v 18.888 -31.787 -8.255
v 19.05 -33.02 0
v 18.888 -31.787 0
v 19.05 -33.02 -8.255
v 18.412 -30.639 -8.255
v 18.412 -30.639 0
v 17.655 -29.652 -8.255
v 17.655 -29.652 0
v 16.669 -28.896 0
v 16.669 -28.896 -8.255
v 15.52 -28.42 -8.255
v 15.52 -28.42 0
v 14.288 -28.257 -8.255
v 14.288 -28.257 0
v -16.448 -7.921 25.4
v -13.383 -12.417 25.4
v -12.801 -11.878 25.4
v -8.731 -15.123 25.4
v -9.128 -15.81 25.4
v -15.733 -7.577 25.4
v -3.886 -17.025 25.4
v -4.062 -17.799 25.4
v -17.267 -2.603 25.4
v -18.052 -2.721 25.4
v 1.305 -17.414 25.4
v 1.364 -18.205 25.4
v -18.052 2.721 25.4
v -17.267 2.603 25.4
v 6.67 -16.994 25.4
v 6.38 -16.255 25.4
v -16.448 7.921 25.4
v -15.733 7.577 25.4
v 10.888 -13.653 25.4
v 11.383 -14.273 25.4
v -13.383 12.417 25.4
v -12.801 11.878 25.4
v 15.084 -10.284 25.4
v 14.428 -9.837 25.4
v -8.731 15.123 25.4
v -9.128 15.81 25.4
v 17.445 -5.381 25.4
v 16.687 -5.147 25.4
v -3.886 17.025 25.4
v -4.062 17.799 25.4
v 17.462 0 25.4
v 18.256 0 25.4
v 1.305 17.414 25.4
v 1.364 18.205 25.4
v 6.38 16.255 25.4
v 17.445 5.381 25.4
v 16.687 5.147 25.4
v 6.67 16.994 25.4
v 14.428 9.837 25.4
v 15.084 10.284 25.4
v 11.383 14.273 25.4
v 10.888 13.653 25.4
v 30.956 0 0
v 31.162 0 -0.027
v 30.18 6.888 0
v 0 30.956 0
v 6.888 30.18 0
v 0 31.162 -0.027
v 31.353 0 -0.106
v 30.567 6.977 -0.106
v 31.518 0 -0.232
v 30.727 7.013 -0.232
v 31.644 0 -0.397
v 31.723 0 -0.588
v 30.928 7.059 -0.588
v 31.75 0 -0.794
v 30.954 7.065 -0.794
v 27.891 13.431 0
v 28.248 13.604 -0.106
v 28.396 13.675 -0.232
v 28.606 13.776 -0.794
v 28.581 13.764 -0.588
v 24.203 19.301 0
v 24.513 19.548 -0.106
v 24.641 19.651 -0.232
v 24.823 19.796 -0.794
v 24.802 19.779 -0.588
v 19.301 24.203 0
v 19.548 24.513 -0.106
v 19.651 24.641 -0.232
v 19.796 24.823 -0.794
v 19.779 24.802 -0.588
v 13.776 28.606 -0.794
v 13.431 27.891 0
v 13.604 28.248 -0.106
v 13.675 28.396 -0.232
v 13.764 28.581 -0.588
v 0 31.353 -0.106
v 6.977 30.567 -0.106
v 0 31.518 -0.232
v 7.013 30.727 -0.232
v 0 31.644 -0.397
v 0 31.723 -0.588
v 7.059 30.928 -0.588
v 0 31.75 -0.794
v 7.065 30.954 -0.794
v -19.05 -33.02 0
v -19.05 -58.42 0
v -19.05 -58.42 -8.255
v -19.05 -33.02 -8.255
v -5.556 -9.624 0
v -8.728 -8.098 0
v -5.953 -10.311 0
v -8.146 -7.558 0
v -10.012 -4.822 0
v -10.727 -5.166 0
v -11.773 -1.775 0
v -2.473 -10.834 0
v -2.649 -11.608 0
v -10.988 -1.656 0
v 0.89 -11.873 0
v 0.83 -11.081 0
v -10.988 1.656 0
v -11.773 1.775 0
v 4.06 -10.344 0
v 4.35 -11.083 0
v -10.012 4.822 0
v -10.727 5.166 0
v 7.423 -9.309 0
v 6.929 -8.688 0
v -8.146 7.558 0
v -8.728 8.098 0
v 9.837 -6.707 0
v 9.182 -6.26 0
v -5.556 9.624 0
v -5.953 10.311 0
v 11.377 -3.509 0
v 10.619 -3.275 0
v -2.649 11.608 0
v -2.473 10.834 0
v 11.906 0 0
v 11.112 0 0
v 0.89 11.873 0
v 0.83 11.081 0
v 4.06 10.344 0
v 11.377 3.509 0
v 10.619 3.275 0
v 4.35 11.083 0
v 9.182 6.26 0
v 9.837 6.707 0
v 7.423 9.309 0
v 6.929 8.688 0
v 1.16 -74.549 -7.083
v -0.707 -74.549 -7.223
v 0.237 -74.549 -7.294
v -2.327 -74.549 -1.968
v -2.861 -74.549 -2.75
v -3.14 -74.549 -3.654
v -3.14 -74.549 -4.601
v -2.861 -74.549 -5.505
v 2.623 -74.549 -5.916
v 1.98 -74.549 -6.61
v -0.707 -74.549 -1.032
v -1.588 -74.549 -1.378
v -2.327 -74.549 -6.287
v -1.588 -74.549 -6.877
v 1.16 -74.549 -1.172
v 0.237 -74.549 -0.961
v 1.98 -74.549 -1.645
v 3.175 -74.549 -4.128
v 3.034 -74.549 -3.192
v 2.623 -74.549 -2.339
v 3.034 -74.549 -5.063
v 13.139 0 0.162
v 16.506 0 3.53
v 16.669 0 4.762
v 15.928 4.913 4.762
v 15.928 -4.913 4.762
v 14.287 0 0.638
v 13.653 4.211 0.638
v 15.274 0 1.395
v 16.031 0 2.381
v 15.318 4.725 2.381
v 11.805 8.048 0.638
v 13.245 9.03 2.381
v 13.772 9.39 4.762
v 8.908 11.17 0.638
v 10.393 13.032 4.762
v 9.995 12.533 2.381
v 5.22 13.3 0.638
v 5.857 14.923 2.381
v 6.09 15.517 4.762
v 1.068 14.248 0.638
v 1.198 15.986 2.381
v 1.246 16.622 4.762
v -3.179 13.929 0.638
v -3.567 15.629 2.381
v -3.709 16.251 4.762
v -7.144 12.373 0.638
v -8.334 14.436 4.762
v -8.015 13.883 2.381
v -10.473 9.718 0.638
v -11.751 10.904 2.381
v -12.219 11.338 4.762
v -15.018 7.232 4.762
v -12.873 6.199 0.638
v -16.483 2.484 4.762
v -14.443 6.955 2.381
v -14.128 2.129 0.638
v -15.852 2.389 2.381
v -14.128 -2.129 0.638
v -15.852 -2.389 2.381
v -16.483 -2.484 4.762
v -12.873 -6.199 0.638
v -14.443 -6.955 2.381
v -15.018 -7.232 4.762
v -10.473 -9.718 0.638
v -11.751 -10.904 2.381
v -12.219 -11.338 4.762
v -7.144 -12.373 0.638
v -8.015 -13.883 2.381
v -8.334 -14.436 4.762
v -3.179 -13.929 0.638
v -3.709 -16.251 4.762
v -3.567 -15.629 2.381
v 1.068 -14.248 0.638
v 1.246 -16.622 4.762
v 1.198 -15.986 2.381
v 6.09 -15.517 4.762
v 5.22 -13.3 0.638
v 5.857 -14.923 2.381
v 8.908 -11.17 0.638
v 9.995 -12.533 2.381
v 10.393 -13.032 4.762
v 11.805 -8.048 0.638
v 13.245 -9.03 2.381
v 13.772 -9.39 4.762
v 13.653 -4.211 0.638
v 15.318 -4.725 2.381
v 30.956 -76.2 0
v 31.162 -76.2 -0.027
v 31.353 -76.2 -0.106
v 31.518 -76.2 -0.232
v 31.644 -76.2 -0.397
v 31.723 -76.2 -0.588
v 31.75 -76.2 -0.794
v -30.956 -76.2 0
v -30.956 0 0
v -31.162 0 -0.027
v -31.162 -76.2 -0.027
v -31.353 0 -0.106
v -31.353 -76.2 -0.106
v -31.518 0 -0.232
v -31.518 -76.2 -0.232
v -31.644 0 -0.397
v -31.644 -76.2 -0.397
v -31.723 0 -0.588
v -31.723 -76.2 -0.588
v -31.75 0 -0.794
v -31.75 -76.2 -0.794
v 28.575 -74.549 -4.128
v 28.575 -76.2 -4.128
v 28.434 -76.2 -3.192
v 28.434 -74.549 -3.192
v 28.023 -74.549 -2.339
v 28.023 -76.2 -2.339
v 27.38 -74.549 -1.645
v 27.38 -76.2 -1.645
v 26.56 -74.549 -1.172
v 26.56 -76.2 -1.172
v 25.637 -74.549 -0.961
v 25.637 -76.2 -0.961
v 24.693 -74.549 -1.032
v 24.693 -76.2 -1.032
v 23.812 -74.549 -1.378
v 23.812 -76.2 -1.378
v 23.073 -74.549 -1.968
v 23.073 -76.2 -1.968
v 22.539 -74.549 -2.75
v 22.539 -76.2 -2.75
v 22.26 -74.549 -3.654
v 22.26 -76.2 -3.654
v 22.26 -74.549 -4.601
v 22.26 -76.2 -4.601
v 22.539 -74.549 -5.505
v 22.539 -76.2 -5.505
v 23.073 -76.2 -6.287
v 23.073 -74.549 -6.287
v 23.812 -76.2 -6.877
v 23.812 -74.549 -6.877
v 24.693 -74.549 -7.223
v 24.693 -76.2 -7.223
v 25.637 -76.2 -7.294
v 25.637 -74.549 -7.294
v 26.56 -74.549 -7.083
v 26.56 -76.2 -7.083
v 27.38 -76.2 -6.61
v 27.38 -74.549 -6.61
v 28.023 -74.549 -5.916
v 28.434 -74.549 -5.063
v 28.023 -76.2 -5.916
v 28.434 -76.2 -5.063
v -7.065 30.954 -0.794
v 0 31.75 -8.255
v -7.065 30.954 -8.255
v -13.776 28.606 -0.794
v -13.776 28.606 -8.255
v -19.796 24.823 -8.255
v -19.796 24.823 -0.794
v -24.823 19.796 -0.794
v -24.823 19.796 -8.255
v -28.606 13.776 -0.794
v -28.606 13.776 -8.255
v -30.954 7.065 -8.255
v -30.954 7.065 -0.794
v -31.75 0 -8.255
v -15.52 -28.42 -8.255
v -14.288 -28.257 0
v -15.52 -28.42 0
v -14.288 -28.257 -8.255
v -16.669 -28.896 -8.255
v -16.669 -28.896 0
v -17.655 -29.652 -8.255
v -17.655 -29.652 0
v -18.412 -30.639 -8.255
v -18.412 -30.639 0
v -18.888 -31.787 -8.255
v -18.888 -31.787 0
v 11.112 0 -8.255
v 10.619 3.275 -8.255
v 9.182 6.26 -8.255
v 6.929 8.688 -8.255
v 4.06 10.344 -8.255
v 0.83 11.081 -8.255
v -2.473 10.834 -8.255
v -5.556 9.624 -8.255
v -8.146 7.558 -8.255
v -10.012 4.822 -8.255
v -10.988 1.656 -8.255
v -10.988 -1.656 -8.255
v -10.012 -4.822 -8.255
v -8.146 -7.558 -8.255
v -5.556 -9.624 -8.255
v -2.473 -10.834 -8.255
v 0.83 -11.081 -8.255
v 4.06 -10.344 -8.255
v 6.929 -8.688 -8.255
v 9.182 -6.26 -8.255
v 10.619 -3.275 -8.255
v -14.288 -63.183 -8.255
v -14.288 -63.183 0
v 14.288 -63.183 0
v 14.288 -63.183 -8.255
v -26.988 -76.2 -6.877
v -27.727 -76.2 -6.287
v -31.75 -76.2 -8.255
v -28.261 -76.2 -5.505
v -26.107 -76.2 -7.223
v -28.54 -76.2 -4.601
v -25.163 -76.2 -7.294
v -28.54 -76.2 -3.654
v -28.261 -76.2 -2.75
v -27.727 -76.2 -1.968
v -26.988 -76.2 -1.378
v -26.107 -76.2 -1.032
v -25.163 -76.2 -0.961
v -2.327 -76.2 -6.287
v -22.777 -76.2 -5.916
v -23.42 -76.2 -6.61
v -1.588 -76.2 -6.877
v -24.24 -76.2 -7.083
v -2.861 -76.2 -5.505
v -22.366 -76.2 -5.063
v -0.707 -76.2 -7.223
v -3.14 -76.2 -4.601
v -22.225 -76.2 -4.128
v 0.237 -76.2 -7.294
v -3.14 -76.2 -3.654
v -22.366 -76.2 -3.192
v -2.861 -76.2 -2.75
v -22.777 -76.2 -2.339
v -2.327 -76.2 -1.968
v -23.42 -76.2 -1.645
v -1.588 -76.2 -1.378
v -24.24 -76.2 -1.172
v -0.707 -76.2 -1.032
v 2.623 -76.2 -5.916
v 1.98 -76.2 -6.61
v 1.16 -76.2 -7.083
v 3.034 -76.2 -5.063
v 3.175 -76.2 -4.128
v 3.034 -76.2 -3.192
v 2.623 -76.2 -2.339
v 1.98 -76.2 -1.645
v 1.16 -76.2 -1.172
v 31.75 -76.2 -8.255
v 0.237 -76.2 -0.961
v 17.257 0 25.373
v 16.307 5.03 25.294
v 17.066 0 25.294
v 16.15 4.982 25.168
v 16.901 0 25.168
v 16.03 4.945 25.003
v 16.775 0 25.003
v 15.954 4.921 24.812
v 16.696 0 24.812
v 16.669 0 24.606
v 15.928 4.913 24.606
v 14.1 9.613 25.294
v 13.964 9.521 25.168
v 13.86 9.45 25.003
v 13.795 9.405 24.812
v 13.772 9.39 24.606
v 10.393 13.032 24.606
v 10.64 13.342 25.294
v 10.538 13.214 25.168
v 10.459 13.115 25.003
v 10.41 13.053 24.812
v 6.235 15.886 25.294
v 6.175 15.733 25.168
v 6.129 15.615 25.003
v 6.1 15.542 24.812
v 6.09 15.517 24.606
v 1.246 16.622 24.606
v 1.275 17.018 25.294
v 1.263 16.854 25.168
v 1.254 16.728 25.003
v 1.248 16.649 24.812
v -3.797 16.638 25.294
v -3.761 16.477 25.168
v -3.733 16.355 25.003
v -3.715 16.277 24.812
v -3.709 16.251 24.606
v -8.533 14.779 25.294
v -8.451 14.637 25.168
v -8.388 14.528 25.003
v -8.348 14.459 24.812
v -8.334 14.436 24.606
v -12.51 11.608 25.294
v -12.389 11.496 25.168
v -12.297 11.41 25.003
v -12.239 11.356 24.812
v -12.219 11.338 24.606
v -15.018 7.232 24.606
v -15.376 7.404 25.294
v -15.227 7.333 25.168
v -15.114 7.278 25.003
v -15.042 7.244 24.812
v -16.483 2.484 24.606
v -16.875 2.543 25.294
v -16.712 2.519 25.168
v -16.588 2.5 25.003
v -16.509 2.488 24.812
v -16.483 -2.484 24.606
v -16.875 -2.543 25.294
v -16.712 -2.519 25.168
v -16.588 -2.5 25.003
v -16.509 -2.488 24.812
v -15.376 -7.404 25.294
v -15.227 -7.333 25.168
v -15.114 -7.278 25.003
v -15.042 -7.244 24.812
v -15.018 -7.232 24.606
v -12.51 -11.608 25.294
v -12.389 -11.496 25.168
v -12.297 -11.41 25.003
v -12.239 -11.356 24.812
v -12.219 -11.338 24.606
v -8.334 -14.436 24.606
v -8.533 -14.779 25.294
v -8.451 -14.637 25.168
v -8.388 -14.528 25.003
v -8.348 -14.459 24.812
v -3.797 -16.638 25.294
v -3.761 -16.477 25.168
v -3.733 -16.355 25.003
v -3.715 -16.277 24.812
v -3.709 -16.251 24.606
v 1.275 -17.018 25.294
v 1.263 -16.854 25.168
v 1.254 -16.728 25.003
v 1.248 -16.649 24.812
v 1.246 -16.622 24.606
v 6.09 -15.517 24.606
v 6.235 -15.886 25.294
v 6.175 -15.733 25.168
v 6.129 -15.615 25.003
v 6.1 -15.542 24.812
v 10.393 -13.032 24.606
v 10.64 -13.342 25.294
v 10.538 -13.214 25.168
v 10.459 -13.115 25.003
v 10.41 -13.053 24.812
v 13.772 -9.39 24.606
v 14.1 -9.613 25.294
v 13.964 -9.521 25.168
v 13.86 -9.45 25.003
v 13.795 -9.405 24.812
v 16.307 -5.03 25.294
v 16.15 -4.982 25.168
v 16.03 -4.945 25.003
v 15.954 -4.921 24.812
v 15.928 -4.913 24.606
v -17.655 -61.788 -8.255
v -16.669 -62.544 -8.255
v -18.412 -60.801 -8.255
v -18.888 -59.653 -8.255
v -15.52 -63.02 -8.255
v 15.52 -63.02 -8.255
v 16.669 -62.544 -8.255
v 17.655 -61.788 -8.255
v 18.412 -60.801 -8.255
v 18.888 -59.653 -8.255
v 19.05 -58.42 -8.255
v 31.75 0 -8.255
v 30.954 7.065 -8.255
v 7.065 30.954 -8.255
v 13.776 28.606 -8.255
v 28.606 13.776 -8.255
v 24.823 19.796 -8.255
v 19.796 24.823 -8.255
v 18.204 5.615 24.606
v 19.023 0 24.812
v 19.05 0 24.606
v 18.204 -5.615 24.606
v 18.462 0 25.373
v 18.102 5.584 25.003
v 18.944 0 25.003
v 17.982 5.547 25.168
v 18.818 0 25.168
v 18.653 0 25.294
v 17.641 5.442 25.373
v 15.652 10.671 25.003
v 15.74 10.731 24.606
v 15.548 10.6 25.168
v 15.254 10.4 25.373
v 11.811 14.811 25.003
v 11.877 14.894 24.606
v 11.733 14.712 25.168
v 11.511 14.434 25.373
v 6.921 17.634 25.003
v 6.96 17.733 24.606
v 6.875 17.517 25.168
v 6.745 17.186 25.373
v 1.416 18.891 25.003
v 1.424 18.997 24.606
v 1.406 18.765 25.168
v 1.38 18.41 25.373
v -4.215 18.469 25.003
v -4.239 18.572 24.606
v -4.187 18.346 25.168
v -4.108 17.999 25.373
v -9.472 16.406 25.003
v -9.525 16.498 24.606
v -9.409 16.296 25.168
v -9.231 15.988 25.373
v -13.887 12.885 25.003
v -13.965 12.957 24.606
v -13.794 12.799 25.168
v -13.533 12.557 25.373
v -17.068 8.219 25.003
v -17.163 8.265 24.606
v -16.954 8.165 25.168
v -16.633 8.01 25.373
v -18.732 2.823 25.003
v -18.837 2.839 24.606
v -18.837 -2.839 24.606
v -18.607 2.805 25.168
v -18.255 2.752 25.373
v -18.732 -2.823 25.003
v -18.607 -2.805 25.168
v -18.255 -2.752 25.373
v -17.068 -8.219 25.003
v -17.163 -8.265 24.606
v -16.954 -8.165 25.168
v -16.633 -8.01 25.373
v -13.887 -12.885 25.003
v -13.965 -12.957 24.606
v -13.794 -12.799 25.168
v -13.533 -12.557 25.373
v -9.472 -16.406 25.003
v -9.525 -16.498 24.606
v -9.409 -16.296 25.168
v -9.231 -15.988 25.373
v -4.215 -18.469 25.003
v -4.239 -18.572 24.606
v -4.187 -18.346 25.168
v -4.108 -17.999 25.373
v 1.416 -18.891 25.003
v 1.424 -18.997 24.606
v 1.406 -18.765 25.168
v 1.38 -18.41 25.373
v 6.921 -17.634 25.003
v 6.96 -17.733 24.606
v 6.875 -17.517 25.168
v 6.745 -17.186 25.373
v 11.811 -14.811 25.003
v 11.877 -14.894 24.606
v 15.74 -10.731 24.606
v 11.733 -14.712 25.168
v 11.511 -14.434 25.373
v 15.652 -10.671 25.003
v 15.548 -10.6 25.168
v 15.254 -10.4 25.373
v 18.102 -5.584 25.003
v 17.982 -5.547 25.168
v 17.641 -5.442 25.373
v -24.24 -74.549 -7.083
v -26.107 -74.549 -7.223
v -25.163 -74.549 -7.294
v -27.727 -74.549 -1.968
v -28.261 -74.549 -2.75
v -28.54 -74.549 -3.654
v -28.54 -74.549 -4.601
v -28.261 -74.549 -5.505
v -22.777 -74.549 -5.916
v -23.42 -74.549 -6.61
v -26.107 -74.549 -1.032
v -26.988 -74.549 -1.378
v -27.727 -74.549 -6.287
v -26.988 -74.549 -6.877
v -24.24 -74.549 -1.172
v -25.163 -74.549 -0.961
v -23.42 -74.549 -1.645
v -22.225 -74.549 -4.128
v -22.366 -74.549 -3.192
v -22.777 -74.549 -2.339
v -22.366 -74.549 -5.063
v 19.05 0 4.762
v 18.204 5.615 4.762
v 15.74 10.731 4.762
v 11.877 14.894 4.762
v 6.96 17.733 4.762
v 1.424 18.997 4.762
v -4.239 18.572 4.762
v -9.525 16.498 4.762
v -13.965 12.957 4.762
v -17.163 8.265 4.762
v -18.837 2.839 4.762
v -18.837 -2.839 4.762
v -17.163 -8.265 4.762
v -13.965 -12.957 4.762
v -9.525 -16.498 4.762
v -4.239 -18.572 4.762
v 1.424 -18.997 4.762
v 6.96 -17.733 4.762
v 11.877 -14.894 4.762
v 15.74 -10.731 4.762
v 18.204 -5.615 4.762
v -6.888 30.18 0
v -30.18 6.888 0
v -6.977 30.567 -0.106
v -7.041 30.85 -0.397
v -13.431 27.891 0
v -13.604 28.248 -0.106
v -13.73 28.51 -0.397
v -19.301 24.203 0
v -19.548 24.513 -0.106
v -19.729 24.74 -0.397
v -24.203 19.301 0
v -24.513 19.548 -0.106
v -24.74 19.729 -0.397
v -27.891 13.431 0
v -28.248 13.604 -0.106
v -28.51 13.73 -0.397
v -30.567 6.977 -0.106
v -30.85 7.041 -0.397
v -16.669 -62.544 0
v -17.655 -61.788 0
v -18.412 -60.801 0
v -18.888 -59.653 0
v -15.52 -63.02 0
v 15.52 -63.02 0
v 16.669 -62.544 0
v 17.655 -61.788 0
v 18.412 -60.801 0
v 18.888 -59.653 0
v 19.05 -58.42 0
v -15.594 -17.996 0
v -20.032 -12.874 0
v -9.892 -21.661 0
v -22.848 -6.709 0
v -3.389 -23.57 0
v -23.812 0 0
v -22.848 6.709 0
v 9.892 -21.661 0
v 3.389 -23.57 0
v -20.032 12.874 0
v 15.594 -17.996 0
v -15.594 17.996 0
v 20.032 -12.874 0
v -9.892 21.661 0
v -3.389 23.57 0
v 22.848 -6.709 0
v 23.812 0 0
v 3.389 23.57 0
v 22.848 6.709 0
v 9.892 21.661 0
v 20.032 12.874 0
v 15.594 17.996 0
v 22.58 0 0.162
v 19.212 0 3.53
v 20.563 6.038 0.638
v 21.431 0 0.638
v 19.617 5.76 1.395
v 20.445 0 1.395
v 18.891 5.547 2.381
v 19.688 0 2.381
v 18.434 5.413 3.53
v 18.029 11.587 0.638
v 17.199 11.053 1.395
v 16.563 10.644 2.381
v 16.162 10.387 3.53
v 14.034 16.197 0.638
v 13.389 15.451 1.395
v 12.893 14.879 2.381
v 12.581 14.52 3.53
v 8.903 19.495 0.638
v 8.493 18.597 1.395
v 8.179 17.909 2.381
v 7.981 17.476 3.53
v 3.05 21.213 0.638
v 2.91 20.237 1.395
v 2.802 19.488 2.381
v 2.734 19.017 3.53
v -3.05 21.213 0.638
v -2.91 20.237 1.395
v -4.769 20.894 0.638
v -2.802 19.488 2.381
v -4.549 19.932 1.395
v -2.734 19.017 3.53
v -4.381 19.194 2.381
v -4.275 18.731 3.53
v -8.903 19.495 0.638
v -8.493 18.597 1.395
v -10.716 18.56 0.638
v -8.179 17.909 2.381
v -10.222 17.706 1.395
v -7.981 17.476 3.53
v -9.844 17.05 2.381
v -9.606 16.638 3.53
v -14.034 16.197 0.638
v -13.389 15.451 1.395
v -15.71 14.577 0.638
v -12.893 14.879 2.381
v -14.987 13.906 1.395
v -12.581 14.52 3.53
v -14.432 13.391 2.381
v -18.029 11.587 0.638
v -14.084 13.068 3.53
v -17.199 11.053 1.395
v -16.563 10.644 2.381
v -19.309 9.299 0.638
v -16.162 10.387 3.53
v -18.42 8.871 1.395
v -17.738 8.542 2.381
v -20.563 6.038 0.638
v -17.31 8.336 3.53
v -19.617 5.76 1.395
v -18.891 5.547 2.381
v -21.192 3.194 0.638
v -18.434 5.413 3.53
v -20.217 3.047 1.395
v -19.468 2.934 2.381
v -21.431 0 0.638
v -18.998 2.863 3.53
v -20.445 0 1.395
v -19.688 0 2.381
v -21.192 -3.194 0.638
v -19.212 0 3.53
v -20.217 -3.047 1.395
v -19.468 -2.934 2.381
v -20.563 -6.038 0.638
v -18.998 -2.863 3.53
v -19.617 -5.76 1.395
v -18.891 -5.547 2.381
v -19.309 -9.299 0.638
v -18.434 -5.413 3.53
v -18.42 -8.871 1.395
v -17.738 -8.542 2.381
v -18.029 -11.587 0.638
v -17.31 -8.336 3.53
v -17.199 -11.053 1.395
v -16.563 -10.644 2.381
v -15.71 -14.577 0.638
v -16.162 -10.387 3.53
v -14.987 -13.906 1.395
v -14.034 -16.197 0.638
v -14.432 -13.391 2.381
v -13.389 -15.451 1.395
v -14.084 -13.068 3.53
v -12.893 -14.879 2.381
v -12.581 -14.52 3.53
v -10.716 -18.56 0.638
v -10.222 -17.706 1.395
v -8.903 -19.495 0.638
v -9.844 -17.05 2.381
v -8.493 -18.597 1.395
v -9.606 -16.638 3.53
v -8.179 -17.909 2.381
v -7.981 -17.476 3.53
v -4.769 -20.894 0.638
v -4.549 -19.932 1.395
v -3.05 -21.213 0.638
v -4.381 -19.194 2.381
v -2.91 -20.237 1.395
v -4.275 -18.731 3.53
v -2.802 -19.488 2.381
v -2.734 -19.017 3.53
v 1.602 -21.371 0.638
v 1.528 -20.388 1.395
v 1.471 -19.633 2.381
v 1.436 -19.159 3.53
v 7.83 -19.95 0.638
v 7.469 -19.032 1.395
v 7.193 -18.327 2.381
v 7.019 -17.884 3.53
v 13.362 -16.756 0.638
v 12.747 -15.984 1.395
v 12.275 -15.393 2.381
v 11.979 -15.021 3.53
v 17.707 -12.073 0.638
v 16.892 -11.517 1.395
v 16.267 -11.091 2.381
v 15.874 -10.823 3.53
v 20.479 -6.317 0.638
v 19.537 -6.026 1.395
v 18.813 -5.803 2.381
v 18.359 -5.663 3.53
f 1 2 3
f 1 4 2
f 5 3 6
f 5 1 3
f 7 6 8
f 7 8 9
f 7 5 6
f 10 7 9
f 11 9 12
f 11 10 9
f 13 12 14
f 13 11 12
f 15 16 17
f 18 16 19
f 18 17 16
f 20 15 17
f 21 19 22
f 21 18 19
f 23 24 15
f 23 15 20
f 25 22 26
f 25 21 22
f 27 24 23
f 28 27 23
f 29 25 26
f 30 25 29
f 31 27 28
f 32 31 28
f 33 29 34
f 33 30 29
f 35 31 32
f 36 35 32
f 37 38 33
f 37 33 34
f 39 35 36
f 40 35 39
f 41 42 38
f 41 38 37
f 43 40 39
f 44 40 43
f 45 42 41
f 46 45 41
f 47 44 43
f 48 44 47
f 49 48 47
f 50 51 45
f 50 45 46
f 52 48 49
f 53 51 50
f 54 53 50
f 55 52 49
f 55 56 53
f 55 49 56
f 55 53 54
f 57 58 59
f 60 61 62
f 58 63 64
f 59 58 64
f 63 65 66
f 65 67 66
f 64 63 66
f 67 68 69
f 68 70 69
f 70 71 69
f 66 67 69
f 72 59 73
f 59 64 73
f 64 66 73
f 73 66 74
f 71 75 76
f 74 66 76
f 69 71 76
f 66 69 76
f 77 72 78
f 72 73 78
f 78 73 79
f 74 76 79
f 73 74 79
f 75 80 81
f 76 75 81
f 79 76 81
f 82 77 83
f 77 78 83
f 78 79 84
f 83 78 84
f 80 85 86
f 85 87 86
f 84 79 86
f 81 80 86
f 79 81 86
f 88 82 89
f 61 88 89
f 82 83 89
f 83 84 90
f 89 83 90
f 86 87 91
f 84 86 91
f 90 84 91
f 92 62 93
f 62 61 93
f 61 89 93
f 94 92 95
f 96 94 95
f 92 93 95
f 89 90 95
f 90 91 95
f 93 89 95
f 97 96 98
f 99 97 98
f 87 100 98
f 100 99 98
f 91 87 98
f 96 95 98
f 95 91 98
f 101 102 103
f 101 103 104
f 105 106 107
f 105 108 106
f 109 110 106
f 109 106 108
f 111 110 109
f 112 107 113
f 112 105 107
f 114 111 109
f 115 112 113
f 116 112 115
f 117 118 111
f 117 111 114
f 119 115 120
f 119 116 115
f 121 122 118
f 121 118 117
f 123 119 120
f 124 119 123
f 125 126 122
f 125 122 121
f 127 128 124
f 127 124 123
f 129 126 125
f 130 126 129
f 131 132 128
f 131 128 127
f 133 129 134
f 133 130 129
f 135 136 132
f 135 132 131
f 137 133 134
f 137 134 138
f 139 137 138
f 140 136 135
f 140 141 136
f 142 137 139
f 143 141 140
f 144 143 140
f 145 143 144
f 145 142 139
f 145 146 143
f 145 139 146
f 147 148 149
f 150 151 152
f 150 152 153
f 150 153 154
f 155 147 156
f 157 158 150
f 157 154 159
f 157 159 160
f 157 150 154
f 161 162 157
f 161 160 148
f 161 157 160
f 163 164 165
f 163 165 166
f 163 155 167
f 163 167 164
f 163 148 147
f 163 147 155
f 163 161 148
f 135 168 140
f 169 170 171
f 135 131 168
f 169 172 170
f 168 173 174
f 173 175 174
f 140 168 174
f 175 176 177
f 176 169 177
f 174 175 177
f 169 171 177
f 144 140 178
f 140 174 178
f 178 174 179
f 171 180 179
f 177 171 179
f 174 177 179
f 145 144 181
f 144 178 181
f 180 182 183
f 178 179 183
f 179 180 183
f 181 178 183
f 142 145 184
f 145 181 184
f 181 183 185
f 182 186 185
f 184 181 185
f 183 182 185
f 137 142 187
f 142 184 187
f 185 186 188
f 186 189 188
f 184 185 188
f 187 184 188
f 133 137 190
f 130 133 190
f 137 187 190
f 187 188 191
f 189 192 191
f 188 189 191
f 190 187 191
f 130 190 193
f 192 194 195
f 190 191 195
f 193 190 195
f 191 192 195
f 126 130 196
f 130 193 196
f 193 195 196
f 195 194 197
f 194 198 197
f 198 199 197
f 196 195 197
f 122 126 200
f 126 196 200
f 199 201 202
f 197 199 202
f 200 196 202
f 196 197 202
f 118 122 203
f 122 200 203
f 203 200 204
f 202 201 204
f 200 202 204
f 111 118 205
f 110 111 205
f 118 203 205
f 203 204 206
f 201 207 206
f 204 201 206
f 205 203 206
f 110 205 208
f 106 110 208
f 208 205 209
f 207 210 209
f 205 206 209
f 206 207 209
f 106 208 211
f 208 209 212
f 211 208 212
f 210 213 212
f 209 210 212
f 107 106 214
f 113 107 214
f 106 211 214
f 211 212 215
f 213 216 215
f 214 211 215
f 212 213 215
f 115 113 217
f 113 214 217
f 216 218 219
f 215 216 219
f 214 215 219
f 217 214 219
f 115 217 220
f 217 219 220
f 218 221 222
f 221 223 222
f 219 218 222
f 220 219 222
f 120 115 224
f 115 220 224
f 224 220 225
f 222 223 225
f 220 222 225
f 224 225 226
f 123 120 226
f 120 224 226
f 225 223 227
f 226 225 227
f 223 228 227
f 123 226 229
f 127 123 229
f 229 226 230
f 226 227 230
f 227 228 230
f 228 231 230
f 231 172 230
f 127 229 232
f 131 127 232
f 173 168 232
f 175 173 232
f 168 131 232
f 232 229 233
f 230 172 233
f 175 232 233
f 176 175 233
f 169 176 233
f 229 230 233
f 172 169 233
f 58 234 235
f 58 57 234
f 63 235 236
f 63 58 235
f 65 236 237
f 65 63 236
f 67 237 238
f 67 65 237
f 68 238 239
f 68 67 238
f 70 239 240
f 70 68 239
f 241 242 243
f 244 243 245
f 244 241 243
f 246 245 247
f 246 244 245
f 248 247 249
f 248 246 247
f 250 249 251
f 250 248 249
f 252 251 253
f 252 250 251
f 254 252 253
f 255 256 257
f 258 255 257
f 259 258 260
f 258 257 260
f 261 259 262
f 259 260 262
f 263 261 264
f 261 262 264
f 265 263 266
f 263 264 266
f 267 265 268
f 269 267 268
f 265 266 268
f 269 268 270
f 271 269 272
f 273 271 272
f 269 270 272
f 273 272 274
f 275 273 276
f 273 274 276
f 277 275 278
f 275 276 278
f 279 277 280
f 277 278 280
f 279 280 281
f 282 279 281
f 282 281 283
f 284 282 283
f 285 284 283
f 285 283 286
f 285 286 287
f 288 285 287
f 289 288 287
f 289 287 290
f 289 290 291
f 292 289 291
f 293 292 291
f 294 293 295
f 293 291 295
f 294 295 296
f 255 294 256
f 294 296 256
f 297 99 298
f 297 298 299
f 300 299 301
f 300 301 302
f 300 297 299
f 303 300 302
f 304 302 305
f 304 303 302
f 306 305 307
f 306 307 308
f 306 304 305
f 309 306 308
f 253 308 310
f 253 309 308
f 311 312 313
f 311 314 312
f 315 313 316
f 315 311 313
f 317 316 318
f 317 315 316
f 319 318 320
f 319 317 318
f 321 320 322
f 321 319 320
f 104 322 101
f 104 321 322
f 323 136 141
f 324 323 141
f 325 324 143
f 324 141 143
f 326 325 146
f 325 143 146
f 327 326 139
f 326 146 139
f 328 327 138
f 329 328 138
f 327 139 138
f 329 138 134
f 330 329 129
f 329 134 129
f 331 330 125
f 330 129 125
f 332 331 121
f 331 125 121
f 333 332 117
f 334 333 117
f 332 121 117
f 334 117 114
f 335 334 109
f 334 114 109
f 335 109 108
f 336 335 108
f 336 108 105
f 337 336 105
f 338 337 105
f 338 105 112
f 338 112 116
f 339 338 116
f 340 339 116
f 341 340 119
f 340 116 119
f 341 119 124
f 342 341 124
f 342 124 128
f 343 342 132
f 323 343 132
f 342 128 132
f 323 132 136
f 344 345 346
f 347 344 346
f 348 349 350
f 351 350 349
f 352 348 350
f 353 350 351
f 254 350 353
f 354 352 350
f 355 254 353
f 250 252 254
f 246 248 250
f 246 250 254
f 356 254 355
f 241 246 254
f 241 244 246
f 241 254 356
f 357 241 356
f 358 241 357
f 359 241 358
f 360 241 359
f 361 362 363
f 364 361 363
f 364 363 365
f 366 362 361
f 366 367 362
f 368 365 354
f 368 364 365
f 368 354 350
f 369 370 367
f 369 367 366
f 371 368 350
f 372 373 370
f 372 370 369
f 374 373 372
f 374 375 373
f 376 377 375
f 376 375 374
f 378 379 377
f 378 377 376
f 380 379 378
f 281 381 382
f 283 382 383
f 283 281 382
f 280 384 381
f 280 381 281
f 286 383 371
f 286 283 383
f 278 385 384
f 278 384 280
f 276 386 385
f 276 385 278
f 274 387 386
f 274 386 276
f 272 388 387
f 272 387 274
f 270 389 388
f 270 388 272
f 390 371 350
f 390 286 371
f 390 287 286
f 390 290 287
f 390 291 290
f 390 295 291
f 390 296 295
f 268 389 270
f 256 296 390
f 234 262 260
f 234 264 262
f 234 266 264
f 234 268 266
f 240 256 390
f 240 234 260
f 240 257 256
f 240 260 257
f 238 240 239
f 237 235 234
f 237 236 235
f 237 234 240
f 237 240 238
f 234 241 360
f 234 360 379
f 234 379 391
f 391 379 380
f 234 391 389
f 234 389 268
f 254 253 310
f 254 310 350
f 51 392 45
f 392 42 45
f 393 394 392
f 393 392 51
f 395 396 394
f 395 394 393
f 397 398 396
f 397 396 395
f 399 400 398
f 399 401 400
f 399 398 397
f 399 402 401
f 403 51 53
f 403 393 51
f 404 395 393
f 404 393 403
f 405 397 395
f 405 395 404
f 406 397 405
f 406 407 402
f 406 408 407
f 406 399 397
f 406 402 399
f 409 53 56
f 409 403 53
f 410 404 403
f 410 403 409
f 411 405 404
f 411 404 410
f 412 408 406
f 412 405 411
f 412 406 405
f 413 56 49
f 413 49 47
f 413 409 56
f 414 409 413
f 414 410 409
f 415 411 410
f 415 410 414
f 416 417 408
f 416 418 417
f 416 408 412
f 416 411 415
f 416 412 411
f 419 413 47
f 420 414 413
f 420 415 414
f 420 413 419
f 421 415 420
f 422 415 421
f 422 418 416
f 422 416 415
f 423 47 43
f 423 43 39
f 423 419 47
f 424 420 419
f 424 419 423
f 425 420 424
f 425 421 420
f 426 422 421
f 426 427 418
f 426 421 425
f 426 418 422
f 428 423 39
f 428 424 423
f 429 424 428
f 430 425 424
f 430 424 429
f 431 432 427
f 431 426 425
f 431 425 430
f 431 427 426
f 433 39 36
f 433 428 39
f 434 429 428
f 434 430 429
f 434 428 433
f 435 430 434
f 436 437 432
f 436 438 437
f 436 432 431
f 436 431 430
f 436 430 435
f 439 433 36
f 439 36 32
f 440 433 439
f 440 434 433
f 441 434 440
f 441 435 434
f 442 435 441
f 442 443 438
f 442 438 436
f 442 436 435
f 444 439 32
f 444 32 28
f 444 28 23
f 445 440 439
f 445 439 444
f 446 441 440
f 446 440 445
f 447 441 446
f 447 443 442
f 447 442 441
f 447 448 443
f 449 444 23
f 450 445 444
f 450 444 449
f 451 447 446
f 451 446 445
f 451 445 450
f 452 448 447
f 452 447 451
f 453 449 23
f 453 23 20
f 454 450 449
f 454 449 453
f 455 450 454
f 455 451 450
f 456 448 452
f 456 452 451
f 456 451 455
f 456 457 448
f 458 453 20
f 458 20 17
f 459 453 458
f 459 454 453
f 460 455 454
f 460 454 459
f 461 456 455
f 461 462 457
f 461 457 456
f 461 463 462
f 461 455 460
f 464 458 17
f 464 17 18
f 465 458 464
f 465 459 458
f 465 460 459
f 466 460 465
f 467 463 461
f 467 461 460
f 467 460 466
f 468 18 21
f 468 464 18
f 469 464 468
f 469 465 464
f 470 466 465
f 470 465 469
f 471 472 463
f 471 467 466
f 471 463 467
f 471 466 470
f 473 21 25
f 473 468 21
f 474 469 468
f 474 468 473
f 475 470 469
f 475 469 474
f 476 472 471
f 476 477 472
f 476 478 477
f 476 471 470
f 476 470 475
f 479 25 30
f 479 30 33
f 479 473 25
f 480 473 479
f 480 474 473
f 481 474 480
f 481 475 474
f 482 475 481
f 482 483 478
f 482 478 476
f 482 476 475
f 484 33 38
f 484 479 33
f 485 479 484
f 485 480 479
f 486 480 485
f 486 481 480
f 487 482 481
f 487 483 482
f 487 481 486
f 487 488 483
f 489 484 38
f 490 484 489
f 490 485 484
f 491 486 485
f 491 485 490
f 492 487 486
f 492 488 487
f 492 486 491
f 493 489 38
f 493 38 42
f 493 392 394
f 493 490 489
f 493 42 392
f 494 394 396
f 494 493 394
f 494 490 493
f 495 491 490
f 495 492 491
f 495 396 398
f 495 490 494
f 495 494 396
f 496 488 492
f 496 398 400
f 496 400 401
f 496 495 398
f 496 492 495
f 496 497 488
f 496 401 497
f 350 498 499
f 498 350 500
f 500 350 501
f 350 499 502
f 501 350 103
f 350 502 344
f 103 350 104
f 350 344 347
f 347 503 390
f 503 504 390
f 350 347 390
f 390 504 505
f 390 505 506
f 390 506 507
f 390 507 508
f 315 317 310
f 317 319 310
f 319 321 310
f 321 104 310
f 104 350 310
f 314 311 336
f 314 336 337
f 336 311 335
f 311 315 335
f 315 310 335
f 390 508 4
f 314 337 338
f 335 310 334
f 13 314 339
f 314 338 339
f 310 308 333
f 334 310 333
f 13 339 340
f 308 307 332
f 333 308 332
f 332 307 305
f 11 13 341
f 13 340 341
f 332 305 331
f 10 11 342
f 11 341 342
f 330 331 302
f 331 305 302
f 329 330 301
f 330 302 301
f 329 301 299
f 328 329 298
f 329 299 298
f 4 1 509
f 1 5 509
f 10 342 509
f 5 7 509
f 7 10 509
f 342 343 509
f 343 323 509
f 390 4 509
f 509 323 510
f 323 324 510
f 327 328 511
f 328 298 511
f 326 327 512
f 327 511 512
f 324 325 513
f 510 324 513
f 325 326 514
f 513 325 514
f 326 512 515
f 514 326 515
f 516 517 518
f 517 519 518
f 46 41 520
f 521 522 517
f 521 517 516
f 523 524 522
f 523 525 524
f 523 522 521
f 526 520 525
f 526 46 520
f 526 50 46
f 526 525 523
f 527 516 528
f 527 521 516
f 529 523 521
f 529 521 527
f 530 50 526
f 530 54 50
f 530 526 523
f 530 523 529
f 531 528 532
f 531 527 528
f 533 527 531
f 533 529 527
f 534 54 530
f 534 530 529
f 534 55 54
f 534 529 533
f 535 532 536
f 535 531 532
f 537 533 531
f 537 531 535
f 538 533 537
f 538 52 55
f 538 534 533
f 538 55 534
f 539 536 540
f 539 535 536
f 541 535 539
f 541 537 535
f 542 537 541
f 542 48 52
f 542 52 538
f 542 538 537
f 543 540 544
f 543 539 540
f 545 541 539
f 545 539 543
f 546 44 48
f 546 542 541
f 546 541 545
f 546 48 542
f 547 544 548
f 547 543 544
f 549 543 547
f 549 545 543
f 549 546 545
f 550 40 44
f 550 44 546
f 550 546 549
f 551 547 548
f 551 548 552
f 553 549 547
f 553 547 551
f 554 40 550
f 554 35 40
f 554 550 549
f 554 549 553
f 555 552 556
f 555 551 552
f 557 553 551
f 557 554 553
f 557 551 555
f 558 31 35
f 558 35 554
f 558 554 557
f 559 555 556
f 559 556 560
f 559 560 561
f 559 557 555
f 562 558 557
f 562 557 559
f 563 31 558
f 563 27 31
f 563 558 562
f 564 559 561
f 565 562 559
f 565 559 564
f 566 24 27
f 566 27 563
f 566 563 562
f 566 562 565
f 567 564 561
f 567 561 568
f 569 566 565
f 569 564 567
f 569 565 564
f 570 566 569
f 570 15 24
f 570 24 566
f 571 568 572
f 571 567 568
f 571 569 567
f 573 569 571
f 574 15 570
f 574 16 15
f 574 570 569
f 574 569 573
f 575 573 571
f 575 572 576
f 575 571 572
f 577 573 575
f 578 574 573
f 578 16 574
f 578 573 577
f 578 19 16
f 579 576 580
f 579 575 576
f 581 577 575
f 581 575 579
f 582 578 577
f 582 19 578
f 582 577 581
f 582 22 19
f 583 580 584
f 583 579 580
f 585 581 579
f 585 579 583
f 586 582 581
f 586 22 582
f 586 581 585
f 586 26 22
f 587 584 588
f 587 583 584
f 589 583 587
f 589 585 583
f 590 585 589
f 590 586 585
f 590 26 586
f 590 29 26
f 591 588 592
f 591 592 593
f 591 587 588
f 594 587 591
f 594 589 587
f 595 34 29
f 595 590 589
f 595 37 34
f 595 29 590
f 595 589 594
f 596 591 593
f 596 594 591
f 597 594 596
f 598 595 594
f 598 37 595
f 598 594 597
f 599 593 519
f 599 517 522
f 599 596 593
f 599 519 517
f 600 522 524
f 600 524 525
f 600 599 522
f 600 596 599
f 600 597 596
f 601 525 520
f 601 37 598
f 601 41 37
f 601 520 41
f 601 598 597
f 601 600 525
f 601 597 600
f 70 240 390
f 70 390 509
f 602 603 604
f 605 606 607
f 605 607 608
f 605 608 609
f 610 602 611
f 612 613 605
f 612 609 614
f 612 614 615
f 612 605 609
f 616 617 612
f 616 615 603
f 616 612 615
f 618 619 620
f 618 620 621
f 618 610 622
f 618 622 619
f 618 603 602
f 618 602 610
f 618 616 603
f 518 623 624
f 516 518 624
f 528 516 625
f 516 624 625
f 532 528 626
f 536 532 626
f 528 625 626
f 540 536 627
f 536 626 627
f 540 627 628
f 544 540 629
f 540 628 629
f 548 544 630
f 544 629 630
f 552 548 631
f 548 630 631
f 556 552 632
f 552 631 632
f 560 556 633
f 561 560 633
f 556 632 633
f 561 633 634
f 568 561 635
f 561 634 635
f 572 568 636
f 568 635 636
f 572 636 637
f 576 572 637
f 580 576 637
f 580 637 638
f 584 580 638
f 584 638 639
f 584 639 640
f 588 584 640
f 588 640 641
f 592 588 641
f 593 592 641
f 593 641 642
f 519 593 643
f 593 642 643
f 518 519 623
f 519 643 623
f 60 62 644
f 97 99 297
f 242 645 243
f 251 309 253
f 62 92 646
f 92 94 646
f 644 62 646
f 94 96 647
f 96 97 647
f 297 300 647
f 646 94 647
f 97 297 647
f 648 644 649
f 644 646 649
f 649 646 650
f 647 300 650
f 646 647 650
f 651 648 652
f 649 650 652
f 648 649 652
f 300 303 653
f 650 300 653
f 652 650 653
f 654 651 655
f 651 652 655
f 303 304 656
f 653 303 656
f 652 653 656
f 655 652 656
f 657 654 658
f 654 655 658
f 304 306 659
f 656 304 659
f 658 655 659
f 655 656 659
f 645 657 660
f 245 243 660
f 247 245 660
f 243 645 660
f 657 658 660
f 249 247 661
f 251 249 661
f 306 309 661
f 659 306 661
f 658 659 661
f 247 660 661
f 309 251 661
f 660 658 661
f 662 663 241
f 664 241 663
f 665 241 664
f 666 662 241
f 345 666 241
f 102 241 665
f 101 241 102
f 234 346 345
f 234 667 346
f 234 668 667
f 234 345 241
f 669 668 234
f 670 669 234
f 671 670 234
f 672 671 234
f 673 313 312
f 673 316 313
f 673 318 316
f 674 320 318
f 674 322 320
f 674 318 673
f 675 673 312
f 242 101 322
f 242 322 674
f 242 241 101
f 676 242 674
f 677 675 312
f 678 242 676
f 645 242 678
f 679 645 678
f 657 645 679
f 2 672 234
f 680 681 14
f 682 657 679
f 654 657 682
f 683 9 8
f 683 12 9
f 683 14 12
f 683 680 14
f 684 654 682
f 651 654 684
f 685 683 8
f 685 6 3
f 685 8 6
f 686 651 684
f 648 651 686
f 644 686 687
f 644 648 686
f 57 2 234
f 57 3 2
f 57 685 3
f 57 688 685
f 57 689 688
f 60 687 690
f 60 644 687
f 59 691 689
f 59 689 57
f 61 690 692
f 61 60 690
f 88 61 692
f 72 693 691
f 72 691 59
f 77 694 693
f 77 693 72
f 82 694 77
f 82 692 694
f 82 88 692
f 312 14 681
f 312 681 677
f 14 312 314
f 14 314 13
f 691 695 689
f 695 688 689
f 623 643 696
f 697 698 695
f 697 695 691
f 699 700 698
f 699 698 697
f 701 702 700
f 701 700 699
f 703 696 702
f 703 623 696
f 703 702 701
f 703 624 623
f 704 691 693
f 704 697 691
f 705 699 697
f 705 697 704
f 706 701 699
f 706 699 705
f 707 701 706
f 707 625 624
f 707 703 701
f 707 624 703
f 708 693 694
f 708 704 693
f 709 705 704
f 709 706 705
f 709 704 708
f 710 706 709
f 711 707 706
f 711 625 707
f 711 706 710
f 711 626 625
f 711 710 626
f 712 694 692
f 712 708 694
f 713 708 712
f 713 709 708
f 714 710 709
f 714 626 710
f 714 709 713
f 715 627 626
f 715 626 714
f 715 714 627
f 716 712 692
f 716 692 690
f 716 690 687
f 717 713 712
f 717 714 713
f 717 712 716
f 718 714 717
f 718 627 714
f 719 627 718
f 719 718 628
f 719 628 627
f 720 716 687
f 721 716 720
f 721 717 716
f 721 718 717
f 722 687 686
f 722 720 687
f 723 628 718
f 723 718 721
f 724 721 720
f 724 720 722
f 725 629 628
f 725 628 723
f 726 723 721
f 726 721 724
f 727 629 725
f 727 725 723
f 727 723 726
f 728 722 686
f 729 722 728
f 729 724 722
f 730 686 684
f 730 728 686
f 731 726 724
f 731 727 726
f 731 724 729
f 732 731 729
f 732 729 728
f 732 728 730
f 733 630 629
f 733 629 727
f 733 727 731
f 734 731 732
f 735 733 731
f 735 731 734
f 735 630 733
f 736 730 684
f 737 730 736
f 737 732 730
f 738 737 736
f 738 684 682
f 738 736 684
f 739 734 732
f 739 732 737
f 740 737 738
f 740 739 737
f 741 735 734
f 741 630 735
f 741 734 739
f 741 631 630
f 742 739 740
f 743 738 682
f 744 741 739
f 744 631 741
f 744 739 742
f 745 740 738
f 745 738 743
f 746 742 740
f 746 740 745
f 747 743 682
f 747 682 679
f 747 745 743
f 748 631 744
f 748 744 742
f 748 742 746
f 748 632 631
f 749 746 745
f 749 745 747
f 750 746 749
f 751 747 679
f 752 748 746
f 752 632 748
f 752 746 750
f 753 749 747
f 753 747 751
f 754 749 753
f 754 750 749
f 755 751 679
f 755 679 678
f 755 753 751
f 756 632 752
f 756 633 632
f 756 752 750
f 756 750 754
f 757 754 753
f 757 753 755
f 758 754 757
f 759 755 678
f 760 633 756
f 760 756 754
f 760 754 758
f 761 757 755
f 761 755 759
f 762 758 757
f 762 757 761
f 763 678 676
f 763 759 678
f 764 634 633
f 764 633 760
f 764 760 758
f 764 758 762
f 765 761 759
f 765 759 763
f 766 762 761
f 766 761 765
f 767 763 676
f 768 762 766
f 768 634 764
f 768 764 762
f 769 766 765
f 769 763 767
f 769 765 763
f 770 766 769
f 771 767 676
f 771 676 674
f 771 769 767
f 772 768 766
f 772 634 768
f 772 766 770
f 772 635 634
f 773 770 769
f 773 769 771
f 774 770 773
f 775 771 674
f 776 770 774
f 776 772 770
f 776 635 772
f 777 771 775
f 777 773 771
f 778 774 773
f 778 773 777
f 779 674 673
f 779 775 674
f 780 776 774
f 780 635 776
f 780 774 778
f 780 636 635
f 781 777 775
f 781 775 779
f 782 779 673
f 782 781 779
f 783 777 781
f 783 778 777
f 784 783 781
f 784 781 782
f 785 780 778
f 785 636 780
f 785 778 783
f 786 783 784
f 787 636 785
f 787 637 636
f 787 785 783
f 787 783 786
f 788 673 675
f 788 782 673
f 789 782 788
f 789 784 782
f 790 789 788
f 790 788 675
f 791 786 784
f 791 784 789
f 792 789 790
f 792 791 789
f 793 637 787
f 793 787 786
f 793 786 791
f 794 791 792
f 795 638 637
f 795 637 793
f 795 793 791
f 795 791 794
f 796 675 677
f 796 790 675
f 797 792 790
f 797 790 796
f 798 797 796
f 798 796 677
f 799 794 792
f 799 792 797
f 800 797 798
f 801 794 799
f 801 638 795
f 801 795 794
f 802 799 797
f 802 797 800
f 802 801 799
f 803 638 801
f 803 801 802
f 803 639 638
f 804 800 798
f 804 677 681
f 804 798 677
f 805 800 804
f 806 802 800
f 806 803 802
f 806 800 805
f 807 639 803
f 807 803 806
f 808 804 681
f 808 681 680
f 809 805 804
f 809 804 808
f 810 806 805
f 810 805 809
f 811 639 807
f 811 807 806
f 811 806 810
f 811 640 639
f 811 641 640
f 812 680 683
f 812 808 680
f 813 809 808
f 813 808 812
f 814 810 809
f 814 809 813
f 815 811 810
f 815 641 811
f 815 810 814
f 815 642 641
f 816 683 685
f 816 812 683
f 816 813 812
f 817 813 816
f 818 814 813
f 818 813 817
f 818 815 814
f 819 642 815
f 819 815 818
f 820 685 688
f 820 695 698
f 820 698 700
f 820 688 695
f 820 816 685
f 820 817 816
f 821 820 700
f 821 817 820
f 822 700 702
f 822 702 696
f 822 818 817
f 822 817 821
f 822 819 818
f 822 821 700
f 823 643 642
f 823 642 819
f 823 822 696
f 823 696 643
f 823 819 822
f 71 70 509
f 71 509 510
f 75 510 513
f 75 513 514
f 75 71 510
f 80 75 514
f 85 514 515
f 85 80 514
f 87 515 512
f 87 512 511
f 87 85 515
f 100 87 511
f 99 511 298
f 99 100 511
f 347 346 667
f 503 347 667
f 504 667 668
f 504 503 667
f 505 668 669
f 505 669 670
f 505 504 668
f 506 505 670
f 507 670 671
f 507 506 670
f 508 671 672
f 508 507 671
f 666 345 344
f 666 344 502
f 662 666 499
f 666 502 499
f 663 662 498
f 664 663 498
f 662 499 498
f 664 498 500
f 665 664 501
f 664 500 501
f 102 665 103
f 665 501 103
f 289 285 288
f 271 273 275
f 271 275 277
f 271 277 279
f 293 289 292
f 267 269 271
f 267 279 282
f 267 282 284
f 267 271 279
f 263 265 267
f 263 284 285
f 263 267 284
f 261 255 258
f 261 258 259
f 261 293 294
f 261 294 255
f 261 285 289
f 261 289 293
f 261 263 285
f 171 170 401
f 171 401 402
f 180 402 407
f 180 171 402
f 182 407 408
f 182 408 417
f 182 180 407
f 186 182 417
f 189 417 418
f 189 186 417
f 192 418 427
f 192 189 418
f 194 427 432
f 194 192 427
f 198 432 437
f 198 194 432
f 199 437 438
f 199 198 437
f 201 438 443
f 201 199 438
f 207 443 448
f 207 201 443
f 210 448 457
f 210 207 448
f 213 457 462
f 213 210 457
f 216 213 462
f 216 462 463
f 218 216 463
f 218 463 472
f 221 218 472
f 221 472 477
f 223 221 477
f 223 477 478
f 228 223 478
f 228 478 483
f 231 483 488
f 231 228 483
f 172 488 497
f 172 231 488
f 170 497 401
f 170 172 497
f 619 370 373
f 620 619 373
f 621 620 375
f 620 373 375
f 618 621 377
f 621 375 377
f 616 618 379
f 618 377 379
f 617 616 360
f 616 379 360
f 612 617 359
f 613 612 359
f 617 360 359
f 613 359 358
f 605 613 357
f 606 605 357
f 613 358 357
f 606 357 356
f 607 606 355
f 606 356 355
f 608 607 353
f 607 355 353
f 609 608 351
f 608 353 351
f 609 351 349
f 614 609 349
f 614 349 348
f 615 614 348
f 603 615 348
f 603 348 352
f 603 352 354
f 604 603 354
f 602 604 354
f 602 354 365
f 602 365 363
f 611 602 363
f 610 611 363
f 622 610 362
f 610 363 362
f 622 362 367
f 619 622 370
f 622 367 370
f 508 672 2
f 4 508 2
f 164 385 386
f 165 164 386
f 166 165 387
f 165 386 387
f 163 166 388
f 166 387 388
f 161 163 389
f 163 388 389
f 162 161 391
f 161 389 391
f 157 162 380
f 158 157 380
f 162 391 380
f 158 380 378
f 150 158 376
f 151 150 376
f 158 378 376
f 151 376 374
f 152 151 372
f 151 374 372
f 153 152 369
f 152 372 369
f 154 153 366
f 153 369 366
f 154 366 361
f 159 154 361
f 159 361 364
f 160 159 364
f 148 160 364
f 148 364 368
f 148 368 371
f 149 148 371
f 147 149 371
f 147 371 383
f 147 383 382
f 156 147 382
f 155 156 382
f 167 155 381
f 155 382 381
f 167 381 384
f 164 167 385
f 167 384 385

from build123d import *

# Parameters (mm, degrees)
F1_DEPTH = 8.255
F2_R     = 19.05
F2_R_2   = 16.66875
F3_DEPTH = 25.4
F4_R     = 3.175
F5_DEPTH = 1.651
F6_W     = 38.1
F6_H     = 34.925
F6_R     = 11.1125
F7_DEPTH = 8.255
F8_R     = 4.7625
F9_R     = 0.79375


with BuildPart() as f1:
    # F0 (on Top) → F1 (new body)
    with BuildSketch(Plane.XY):
        with BuildLine():
            ThreePointArc((31.75, 0), (22.45064, 22.45064), (0, 31.75))
            ThreePointArc((0, 31.75), (-22.45064, 22.45064), (-31.75, 0))
            Line((-31.75, 0), (-31.75, -76.2))
            Line((-31.75, -76.2), (0, -76.2))
            Line((0, -76.2), (31.75, -76.2))
            Line((31.75, -76.2), (31.75, 0))
        make_face()
    extrude(amount=-F1_DEPTH)

    # F2 (on face) → F3 (join)
    with BuildSketch(Plane.XY):
        Circle(F2_R)
        Circle(F2_R_2, mode=Mode.SUBTRACT)
    extrude(amount=F3_DEPTH)

    # F4 (on face) → F5 (cut)
    with BuildSketch(Plane.XZ.offset(76.2)):
        with Locations((-25.4, -4.1275)):
            Circle(F4_R)
        with Locations((0, -4.1275)):
            Circle(F4_R)
        with Locations((25.4, -4.1275)):
            Circle(F4_R)
    extrude(amount=-F5_DEPTH, mode=Mode.SUBTRACT)

    # F6 (on face) → F7 (cut, through all)
    with BuildSketch(Plane.XY):
        with Locations((0, -45.72)):
            Rectangle(F6_W, F6_H)
        Circle(F6_R)
    extrude(amount=-F7_DEPTH, mode=Mode.SUBTRACT)

    # F8
    f8_edges = [f1.edges().sort_by_distance(p)[0] for p in [
        (-19.05, 0, 0),
        (-16.66875, 0, 0),
        (-19.05, -28.2575, -4.1275),
        (19.05, -28.2575, -4.1275),
        (-19.05, -63.1825, -4.1275),
        (19.05, -63.1825, -4.1275),
    ]]
    fillet(f8_edges, radius=F8_R)

    # F9
    f9_edges = [f1.edges().sort_by_distance(p)[0] for p in [
        (-19.05, 0, 25.4),
        (-16.66875, 0, 25.4),
        (-31.75, -38.1, 0),
    ]]
    fillet(f9_edges, radius=F9_R)


solid = f1.part
